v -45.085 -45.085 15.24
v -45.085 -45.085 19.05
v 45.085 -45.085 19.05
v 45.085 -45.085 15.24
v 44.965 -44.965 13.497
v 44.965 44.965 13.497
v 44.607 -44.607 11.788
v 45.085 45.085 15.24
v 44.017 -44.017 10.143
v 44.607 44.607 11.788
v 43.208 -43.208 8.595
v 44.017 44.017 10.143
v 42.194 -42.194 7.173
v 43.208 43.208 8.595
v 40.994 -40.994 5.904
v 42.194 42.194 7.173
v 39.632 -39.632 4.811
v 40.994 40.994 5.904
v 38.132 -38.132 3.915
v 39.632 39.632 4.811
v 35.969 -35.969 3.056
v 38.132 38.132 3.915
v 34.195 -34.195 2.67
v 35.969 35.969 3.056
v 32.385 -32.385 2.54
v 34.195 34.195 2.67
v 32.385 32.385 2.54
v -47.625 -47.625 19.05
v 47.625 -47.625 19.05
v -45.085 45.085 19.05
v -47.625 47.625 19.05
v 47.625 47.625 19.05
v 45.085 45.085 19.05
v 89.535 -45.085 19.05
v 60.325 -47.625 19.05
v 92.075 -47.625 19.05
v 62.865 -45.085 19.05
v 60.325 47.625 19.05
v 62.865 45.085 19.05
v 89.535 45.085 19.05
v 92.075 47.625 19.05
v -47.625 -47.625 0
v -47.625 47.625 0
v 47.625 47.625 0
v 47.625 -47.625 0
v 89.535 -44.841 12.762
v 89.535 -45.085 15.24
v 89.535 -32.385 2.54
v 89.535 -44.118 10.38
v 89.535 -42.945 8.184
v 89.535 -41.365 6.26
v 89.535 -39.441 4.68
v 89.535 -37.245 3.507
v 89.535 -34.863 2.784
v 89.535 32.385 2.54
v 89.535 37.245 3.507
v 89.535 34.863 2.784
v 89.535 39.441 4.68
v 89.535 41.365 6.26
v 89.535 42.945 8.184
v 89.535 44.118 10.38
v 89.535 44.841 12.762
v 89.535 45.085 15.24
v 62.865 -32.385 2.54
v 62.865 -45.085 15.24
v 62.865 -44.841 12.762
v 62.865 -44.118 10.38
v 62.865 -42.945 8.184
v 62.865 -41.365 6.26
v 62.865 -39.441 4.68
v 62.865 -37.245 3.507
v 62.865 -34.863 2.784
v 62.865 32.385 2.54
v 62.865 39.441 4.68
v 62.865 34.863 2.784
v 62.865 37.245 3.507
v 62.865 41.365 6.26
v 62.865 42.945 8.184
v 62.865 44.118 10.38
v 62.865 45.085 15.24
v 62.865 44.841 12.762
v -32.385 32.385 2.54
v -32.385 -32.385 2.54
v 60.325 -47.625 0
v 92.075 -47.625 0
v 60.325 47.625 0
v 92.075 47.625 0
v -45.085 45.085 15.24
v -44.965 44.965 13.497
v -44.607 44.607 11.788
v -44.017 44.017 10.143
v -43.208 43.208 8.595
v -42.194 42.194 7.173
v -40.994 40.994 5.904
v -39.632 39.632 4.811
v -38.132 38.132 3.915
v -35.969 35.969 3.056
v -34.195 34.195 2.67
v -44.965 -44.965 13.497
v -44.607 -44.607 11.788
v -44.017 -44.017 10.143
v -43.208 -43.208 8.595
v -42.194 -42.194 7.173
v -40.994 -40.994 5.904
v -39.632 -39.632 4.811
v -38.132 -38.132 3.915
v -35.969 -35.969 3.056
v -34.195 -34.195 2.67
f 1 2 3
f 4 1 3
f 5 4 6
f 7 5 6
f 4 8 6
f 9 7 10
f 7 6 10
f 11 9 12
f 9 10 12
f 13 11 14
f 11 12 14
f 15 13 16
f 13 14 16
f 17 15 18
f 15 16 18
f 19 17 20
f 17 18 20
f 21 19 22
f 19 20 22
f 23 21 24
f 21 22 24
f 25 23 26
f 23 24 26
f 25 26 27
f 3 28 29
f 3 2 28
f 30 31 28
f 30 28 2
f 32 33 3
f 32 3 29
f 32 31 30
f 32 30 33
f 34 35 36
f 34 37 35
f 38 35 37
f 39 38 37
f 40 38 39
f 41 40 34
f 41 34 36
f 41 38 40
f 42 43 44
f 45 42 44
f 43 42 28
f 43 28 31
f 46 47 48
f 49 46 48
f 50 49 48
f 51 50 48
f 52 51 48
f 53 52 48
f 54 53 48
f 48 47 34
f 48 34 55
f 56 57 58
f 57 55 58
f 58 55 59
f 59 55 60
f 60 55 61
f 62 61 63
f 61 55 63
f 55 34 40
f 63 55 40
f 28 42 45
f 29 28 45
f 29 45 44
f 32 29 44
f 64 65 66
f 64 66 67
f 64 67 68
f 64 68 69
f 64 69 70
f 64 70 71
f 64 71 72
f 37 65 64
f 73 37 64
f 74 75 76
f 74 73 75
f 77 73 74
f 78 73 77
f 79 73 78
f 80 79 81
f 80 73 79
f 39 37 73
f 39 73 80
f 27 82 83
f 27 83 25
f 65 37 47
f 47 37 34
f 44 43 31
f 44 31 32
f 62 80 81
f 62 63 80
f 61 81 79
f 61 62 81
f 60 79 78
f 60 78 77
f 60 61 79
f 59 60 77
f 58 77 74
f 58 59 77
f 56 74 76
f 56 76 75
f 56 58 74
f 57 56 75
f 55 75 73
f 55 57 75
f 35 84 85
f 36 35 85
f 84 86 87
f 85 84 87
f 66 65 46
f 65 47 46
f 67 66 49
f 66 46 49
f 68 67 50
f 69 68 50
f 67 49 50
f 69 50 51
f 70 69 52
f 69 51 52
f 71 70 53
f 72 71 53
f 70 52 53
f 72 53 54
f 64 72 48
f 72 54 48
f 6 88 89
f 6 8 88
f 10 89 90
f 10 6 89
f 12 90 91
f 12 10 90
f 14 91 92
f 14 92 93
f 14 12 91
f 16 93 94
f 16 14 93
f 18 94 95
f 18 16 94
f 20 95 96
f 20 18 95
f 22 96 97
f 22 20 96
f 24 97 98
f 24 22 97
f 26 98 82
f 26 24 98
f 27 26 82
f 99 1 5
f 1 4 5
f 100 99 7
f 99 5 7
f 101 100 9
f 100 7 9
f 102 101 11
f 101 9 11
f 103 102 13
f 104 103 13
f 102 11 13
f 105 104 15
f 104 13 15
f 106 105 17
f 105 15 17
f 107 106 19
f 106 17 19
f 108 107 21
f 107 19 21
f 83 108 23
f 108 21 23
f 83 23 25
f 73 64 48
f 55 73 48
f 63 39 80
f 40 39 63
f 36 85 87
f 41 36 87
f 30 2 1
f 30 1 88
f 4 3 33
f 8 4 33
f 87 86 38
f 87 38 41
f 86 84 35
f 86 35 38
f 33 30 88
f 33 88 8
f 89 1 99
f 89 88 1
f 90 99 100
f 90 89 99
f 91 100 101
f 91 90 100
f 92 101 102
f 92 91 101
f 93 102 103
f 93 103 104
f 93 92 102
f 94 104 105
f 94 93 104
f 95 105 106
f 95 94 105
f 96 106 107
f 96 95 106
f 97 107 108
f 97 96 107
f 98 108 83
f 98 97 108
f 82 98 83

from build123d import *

# Parameters (mm, degrees)
F0_W     = 95.25
F0_H     = 95.25
F0_W_2   = 31.75
F1_DEPTH = 19.05
F2_W     = 90.17
F2_H     = 90.17
F2_W_2   = 26.67
F3_DEPTH = 16.51
F4_R     = 12.7


with BuildPart() as f1:
    # F0 (on Top) → F1 (new body)
    with BuildSketch(Plane.XY):
        Rectangle(F0_W, F0_H)
        with Locations((76.2, 0)):
            Rectangle(F0_W_2, F0_H)
    extrude(amount=F1_DEPTH)

    # F2 (on face) → F3 (cut)
    with BuildSketch(Plane.XY.offset(19.05)):
        Rectangle(F2_W, F2_H)
        with Locations((76.2, 0)):
            Rectangle(F2_W_2, F2_H)
    extrude(amount=-F3_DEPTH, mode=Mode.SUBTRACT)

    # F4
    f4_edges = [f1.edges().sort_by_distance(p)[0] for p in [
        (45.085, 0, 2.54),
        (0, 45.085, 2.54),
        (-45.085, 0, 2.54),
        (0, -45.085, 2.54),
        (76.2, 45.085, 2.54),
        (76.2, -45.085, 2.54),
    ]]
    fillet(f4_edges, radius=F4_R)


solid = f1.part
